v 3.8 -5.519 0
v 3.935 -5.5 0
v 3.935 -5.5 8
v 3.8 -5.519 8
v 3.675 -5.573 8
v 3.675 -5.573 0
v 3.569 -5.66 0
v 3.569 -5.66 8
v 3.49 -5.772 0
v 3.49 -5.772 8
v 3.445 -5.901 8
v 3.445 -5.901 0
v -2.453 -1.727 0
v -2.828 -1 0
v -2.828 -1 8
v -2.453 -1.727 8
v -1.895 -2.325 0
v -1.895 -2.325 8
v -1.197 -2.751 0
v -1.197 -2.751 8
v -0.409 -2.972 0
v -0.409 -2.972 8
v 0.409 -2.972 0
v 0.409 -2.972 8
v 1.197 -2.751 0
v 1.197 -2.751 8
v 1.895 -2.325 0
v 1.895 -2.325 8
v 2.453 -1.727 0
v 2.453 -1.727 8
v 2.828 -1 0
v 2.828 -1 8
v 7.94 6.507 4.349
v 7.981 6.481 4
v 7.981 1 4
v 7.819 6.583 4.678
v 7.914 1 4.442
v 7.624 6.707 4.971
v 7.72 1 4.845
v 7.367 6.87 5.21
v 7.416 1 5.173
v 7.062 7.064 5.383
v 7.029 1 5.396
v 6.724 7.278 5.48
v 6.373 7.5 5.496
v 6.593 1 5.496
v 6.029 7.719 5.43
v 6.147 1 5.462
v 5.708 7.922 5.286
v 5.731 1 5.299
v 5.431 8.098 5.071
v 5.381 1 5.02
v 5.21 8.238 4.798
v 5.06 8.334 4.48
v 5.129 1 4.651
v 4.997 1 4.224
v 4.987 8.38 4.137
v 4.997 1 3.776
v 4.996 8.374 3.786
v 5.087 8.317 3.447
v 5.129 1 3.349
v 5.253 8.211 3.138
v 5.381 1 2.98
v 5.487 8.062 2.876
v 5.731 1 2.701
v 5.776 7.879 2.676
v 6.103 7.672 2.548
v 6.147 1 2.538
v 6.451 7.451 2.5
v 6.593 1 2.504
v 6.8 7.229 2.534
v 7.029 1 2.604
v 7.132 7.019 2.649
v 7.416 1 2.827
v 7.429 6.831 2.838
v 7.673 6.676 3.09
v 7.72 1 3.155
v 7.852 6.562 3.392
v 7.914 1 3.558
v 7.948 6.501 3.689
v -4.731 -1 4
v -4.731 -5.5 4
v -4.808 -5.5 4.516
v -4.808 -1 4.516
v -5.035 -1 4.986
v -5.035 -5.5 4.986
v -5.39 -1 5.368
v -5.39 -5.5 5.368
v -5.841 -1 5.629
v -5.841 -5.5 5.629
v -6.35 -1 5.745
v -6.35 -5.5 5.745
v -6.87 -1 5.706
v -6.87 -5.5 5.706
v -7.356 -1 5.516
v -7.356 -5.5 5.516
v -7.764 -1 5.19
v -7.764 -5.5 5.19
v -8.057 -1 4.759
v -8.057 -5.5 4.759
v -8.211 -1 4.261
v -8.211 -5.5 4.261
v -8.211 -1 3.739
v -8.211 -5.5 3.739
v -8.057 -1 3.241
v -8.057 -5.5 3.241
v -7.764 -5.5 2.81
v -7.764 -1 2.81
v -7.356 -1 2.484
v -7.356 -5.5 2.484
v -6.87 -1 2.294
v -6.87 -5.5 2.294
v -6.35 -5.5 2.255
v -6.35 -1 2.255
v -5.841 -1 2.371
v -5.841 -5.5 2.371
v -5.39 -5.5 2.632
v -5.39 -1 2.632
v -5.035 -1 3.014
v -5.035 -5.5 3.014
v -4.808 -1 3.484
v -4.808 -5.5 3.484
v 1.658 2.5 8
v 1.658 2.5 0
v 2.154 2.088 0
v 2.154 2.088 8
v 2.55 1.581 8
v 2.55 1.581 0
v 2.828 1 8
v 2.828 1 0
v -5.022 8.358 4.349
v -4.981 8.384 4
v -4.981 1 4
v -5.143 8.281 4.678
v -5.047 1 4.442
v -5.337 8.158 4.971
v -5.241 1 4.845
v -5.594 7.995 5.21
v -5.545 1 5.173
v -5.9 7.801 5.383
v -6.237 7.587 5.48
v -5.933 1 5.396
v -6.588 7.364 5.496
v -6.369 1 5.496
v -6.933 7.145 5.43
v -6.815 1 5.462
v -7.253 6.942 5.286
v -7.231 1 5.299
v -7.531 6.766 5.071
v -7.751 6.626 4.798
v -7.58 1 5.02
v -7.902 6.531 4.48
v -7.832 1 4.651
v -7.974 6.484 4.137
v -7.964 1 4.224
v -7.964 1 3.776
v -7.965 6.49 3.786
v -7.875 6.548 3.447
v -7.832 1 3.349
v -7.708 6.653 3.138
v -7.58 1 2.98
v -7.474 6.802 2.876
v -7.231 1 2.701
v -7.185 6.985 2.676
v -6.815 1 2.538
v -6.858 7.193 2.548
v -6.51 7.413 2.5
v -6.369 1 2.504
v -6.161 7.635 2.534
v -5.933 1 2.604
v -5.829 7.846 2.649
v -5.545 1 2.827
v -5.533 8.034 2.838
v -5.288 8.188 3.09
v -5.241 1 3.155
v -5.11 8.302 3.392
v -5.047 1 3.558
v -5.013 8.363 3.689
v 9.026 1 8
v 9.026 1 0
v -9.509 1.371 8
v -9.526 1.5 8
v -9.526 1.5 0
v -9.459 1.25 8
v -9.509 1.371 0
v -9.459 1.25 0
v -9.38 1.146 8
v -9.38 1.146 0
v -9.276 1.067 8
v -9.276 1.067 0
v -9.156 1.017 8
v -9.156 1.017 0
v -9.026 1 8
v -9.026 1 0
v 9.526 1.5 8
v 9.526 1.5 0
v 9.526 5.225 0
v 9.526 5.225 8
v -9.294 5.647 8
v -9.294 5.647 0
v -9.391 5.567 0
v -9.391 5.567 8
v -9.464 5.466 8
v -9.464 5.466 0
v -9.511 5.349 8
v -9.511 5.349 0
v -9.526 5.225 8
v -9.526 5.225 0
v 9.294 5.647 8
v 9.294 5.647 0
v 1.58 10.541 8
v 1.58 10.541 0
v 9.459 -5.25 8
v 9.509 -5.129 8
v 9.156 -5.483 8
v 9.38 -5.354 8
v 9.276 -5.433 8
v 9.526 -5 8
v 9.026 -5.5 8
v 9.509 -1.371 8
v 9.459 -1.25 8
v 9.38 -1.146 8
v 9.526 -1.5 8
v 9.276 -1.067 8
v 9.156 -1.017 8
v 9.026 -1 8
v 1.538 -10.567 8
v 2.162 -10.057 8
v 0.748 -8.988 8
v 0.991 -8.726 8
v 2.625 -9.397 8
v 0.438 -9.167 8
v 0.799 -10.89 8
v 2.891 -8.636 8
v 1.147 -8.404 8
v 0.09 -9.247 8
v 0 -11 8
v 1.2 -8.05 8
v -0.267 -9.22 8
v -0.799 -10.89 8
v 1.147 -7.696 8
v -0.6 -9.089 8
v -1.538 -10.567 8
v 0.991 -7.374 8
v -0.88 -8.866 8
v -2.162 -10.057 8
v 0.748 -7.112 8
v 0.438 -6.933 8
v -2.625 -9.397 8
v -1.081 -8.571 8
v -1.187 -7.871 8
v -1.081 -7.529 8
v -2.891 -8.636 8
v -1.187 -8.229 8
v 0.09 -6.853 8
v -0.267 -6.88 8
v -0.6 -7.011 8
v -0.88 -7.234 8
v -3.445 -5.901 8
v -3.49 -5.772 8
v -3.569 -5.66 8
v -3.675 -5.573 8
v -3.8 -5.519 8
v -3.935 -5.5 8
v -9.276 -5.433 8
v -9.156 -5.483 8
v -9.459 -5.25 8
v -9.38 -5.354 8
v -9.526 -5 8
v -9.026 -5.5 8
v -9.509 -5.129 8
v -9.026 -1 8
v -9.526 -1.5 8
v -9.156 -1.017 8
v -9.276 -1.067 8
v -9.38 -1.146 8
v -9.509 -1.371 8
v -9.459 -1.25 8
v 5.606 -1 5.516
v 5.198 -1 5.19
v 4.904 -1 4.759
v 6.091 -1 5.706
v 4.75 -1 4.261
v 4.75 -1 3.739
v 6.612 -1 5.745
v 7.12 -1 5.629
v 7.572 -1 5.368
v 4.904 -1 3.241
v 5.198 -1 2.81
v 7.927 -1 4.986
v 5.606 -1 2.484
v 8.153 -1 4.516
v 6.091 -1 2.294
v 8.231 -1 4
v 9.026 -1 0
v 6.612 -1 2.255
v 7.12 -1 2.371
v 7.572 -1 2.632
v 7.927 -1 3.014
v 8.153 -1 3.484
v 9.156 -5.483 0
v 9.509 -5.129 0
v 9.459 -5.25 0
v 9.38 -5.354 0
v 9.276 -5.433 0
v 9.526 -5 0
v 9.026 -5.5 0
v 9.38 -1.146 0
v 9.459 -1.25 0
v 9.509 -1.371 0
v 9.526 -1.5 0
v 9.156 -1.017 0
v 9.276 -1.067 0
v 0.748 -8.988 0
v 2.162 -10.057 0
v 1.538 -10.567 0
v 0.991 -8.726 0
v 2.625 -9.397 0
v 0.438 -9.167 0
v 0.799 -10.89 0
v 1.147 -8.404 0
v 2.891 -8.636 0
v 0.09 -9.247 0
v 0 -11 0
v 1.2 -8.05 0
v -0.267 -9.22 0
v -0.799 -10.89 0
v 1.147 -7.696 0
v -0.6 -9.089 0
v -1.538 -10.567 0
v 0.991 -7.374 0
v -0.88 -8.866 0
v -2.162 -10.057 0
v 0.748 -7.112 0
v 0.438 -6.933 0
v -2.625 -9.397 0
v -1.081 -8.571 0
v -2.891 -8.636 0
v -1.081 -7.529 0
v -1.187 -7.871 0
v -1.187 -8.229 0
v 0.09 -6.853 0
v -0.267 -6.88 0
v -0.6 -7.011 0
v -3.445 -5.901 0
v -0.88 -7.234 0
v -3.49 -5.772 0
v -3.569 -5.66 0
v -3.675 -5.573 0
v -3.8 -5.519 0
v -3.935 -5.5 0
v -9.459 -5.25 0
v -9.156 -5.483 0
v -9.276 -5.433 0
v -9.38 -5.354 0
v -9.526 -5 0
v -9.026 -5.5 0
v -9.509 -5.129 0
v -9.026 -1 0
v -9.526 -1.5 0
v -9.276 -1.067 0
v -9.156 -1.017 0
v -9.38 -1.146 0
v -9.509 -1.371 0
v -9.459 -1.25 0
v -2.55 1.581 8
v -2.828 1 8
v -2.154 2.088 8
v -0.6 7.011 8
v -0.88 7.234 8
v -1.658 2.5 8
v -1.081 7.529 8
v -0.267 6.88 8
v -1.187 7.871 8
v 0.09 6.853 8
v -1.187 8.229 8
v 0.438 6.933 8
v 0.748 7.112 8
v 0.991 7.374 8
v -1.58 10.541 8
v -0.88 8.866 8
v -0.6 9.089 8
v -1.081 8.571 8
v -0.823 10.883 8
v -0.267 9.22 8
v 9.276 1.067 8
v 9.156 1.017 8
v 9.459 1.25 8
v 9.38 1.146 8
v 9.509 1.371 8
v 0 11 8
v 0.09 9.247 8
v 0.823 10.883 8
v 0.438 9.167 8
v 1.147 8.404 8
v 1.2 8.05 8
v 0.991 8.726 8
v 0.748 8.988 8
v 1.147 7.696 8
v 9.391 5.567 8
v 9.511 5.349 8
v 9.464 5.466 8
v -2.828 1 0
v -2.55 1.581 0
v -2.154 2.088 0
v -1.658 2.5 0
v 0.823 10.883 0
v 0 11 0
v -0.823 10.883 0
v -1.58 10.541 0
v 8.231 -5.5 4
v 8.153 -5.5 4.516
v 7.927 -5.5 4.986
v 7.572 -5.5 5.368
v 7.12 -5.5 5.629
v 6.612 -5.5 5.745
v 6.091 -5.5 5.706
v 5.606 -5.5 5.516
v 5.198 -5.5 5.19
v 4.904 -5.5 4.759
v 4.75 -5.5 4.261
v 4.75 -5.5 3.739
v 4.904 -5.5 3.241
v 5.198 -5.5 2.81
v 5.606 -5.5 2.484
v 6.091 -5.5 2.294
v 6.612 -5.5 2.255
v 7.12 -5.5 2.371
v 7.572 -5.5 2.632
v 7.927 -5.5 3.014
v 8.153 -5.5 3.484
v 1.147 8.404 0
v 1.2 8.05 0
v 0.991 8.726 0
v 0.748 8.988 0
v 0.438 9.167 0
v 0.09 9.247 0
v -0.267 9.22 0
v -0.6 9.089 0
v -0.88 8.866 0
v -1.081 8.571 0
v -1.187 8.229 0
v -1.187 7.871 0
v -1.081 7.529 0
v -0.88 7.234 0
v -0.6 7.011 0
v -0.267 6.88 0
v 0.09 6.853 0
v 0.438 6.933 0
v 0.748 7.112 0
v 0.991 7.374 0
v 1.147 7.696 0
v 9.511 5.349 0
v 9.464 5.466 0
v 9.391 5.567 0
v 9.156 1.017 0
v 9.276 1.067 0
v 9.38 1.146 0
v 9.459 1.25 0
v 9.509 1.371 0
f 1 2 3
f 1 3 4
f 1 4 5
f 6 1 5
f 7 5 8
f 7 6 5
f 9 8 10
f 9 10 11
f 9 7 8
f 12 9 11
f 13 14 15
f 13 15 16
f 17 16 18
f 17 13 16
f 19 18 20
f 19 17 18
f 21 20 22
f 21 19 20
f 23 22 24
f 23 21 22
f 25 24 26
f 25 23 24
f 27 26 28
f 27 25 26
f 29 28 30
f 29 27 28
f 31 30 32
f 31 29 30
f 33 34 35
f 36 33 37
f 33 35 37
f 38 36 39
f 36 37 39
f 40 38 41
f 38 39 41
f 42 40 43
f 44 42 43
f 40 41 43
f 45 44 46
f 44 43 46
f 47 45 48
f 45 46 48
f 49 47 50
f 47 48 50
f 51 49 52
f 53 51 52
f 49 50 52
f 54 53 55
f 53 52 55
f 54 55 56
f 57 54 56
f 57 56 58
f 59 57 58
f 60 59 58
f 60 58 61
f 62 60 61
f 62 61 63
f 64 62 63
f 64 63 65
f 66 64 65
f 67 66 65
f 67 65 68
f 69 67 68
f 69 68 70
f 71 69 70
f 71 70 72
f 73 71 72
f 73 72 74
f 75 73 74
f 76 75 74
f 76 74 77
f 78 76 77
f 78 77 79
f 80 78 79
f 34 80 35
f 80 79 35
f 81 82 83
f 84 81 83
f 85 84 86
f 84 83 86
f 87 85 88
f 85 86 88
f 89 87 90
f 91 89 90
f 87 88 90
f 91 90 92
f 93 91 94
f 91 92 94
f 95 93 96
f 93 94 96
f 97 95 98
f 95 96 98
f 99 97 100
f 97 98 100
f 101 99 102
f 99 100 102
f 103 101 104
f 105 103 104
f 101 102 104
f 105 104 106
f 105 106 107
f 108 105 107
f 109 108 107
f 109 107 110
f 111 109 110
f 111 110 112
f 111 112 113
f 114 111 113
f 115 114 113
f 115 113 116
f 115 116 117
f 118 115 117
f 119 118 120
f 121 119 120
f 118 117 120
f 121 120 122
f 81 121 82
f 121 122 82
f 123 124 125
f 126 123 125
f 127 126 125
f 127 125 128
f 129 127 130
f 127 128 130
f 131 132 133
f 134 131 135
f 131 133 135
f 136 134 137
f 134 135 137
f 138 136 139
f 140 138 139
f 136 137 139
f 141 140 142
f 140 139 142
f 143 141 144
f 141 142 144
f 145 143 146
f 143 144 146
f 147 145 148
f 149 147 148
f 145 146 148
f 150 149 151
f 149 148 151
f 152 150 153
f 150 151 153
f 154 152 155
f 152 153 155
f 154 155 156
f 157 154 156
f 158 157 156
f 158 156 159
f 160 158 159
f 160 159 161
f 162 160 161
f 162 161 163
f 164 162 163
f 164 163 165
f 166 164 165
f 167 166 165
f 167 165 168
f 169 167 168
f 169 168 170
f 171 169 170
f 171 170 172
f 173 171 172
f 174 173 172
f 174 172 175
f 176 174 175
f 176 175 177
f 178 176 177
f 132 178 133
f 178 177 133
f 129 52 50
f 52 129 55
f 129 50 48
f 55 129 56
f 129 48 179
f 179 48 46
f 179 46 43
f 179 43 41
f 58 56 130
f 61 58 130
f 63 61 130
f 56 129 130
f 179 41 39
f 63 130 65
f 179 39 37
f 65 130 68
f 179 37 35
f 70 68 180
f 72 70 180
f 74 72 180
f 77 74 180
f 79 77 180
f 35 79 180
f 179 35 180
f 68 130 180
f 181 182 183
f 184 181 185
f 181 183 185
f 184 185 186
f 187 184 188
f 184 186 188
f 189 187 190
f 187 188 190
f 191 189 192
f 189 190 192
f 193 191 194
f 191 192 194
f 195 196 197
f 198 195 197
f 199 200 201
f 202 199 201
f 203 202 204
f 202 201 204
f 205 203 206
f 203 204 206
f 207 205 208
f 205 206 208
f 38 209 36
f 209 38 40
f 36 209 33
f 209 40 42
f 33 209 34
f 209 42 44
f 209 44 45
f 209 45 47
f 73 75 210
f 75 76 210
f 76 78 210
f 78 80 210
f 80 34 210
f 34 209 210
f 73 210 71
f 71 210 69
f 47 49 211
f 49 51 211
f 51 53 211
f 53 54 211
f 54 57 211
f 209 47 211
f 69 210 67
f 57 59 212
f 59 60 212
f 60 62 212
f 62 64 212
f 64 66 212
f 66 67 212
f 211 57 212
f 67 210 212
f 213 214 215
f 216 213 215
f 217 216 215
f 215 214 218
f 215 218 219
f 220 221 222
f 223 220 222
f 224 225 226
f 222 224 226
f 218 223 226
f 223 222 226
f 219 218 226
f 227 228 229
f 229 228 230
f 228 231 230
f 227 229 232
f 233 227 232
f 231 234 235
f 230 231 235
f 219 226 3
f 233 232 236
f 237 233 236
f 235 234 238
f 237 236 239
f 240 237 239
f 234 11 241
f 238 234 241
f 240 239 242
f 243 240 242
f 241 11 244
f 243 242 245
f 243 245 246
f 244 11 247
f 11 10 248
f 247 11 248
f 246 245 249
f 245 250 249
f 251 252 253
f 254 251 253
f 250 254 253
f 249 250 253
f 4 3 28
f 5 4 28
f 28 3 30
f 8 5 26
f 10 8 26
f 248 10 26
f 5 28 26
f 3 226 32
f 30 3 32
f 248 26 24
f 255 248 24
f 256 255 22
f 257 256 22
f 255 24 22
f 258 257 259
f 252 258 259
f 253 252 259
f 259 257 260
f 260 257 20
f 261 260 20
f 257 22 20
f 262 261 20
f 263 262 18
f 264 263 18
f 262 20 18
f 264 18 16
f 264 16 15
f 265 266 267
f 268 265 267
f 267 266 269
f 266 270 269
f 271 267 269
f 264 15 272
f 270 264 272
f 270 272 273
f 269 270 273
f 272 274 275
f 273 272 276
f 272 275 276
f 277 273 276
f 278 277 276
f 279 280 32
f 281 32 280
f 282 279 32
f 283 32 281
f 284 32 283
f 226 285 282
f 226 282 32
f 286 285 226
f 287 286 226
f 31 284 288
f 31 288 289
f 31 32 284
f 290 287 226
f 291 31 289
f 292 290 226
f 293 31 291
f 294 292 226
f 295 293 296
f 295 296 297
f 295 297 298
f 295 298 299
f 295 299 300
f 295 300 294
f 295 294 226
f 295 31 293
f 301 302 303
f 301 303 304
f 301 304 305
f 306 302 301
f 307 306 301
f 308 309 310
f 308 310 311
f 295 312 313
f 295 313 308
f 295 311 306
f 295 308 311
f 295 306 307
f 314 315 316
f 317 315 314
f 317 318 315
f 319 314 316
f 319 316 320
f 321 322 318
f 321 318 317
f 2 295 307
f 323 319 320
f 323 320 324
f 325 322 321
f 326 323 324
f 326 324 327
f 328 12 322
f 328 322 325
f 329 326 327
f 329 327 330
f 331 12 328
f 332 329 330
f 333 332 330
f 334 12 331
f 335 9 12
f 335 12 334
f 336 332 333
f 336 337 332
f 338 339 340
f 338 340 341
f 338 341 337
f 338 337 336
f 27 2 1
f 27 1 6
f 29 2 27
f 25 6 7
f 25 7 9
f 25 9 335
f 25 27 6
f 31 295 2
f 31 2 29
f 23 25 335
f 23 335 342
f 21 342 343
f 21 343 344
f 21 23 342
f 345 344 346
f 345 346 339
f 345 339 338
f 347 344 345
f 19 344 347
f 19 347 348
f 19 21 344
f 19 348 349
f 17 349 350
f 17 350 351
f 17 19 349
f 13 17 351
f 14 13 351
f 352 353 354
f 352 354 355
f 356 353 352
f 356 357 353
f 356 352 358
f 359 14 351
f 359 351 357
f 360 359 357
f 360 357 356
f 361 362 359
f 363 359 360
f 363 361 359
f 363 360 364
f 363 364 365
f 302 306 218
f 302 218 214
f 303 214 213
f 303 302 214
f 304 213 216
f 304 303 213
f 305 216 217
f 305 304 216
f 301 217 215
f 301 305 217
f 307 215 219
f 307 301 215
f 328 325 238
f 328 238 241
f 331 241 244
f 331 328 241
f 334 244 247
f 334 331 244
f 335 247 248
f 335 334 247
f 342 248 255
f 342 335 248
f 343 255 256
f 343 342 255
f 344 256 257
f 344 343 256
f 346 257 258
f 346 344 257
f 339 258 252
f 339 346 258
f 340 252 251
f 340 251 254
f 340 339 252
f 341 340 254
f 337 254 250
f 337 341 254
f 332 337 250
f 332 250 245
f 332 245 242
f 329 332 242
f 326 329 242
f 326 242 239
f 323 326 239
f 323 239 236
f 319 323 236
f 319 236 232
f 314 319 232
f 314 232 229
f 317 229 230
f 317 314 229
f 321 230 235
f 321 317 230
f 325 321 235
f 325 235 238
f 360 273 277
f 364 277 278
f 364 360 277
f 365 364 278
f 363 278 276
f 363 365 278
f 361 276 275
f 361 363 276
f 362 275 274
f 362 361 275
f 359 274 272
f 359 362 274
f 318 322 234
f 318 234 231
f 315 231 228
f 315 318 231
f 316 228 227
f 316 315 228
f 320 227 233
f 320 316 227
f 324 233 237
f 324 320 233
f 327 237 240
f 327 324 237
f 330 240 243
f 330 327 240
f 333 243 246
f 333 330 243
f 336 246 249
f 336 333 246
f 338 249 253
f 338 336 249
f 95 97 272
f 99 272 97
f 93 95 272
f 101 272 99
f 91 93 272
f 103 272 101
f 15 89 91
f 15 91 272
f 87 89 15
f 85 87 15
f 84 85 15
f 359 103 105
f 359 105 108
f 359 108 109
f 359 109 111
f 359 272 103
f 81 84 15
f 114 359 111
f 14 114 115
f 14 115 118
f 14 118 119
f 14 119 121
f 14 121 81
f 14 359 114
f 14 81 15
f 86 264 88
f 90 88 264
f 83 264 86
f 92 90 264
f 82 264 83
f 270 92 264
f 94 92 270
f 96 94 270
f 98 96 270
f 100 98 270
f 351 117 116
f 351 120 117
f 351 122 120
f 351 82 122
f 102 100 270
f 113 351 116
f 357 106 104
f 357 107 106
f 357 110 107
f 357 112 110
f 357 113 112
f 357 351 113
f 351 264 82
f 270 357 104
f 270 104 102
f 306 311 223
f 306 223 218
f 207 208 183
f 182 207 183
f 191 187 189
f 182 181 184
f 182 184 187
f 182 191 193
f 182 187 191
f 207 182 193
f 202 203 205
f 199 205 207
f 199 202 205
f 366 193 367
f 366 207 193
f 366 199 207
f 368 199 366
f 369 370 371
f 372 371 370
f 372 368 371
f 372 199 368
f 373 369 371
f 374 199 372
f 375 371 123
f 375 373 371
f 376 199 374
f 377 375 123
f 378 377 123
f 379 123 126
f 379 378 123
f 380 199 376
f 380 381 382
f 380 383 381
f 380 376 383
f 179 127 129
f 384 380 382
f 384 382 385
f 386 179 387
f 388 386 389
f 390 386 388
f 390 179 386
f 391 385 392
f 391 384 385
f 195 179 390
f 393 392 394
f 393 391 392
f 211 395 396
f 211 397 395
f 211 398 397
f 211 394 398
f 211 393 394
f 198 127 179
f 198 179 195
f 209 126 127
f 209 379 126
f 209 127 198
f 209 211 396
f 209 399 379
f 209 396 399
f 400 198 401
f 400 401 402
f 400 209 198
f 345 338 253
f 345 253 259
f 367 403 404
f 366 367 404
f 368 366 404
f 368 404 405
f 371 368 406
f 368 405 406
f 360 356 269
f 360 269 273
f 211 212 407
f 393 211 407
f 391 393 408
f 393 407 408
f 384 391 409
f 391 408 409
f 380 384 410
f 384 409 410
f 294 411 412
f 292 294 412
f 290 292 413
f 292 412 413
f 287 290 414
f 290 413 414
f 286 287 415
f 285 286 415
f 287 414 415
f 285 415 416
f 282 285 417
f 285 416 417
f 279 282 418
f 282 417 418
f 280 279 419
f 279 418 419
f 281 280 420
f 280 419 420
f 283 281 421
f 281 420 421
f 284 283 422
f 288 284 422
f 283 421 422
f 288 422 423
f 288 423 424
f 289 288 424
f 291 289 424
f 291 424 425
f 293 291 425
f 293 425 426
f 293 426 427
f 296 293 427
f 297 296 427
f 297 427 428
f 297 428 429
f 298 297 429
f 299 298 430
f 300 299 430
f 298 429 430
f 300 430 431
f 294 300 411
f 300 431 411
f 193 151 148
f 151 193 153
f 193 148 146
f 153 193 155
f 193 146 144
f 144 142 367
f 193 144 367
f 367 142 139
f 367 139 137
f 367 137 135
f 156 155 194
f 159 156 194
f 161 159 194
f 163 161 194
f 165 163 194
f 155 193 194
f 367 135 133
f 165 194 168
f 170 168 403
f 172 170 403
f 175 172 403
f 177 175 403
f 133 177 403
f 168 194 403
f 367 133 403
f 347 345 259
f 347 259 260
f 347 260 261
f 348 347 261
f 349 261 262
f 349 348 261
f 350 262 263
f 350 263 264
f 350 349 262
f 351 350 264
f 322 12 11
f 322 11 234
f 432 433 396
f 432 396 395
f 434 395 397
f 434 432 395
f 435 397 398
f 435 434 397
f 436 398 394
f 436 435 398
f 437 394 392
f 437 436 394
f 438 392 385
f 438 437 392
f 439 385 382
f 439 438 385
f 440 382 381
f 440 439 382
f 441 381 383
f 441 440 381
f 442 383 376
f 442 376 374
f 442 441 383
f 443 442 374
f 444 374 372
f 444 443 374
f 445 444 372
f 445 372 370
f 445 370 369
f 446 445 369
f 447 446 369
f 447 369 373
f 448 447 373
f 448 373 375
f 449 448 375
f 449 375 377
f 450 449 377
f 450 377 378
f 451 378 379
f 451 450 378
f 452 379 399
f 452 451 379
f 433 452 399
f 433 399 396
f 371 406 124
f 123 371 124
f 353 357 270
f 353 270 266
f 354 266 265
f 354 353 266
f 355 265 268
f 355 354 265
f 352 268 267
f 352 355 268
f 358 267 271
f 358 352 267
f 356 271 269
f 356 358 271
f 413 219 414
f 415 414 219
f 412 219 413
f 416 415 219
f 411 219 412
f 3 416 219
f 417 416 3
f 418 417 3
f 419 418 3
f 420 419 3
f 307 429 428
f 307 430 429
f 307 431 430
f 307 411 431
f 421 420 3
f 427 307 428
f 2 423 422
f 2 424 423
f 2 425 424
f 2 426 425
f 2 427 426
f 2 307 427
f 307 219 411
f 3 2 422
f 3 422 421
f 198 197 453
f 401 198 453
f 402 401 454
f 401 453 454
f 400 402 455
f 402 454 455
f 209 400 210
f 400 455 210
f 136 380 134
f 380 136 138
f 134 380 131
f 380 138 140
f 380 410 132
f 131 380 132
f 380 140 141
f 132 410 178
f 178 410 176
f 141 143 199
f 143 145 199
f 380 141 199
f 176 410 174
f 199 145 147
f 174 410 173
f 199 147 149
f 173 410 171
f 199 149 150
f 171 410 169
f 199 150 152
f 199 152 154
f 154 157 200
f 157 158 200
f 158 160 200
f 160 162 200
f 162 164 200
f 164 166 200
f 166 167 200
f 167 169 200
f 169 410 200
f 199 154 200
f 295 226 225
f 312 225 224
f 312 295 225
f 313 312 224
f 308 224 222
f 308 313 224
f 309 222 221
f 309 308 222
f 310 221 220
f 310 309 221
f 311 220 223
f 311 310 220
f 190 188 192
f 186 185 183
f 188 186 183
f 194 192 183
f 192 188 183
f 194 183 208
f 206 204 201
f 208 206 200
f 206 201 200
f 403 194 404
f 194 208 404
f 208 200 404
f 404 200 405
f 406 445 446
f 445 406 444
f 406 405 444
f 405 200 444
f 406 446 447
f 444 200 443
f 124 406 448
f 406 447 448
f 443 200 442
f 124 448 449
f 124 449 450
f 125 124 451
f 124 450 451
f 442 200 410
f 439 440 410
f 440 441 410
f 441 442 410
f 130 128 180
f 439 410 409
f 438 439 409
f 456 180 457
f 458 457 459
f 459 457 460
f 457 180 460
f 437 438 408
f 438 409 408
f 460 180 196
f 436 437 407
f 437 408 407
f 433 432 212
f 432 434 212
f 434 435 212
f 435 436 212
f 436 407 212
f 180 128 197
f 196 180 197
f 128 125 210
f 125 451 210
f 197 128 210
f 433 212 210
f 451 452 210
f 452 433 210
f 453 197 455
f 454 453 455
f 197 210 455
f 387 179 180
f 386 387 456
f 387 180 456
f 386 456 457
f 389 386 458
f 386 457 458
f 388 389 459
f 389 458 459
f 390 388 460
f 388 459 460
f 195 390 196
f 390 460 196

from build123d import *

# Parameters (mm, degrees)
SKETCH_1_R          = 1.2
EXTRUDE_1_DEPTH     = 8
EXTRUDE_1_2_DEPTH   = 8
SKETCH_2_R          = 1.5
CUT_EXTRUDE_1_DEPTH = 17.5
SKETCH_3_R          = 1.75
CUT_EXTRUDE_2_DEPTH = 4.5


with BuildPart() as part:
    # 草图1 → 凸台-拉伸1 (new body)
    with BuildSketch(Plane.XY):
        with BuildLine():
            Line((-1.658312395, 2.5), (1.658312395, 2.5))
            ThreePointArc((1.658312395, 2.5), (2.365419176, 1.84520788), (2.828427125, 1))
            Line((2.828427125, 1), (9.026279442, 1))
            ThreePointArc((9.026279442, 1), (9.379832832, 1.146446609), (9.526279442, 1.5))
            Line((9.526279442, 1.5), (9.526279442, 5.22507425))
            ThreePointArc((9.526279442, 5.22507425), (9.464414867, 5.465983671), (9.294130046, 5.647278056))
            Line((9.294130046, 5.647278056), (1.580318565, 10.541002455))
            ThreePointArc((1.580318565, 10.541002455), (0, 11), (-1.580318565, 10.541002455))
            Line((-1.580318565, 10.541002455), (-9.294130046, 5.647278056))
            ThreePointArc((-9.294130046, 5.647278056), (-9.464414867, 5.465983671), (-9.526279442, 5.22507425))
            Line((-9.526279442, 5.22507425), (-9.526279442, 1.5))
            ThreePointArc((-9.526279442, 1.5), (-9.379832832, 1.146446609), (-9.026279442, 1))
            Line((-9.026279442, 1), (-2.828427125, 1))
            ThreePointArc((-2.828427125, 1), (-2.365419176, 1.84520788), (-1.658312395, 2.5))
        make_face()
        with Locations((0, 8.05)):
            Circle(SKETCH_1_R, mode=Mode.SUBTRACT)
    extrude(amount=EXTRUDE_1_DEPTH)


with BuildPart() as body_2:
    # 草图1 → Extrude 1 2 (new body)
    with BuildSketch(Plane.XY):
        with BuildLine():
            Line((-9.026279442, -1), (-2.828427125, -1))
            ThreePointArc((-2.828427125, -1), (0, -3), (2.828427125, -1))
            Line((2.828427125, -1), (9.026279442, -1))
            ThreePointArc((9.026279442, -1), (9.379832832, -1.146446609), (9.526279442, -1.5))
            Line((9.526279442, -1.5), (9.526279442, -5))
            ThreePointArc((9.526279442, -5), (9.379832832, -5.353553391), (9.026279442, -5.5))
            Line((9.026279442, -5.5), (3.935174447, -5.5))
            ThreePointArc((3.935174447, -5.5), (3.6186464, -5.612947037), (3.445121974, -5.900760016))
            Line((3.445121974, -5.900760016), (2.891309587, -8.635515904))
            ThreePointArc((2.891309587, -8.635515904), (0, -11), (-2.891309587, -8.635515904))
            Line((-2.891309587, -8.635515904), (-3.445121974, -5.900760016))
            ThreePointArc((-3.445121974, -5.900760016), (-3.6186464, -5.612947037), (-3.935174447, -5.5))
            Line((-3.935174447, -5.5), (-9.026279442, -5.5))
            ThreePointArc((-9.026279442, -5.5), (-9.379832832, -5.353553391), (-9.526279442, -5))
            Line((-9.526279442, -5), (-9.526279442, -1.5))
            ThreePointArc((-9.526279442, -1.5), (-9.379832832, -1.146446609), (-9.026279442, -1))
        make_face()
        with Locations((0, -8.05)):
            Circle(SKETCH_1_R, mode=Mode.SUBTRACT)
    extrude(amount=EXTRUDE_1_2_DEPTH)


with BuildPart() as cut_extrude_1_tool:
    # 草图2 → 切除-拉伸1 (new body, through all)
    with BuildSketch(Plane.XZ.offset(5.5)):
        with Locations((6.480726944, 4)):
            Circle(SKETCH_2_R)
        with Locations((-6.480726944, 4)):
            Circle(SKETCH_2_R)
    extrude(amount=-CUT_EXTRUDE_1_DEPTH)


with BuildPart() as part_1:
    add(part.part)

    # 切除-拉伸1: cut by cut_extrude_1_tool
    add(cut_extrude_1_tool.part, mode=Mode.SUBTRACT)


with BuildPart() as body_2_1:
    add(body_2.part)

    # 切除-拉伸1: cut by cut_extrude_1_tool
    add(cut_extrude_1_tool.part, mode=Mode.SUBTRACT)

    # 草图3 → 切除-拉伸2 (cut)
    with BuildSketch(Plane.XZ.offset(5.5)):
        with Locations((-6.480726944, 4)):
            Circle(SKETCH_3_R)
        with Locations((6.480726944, 4)):
            Circle(SKETCH_3_R)
    extrude(amount=-CUT_EXTRUDE_2_DEPTH, mode=Mode.SUBTRACT)


solid = Compound([part_1.part, body_2_1.part])
